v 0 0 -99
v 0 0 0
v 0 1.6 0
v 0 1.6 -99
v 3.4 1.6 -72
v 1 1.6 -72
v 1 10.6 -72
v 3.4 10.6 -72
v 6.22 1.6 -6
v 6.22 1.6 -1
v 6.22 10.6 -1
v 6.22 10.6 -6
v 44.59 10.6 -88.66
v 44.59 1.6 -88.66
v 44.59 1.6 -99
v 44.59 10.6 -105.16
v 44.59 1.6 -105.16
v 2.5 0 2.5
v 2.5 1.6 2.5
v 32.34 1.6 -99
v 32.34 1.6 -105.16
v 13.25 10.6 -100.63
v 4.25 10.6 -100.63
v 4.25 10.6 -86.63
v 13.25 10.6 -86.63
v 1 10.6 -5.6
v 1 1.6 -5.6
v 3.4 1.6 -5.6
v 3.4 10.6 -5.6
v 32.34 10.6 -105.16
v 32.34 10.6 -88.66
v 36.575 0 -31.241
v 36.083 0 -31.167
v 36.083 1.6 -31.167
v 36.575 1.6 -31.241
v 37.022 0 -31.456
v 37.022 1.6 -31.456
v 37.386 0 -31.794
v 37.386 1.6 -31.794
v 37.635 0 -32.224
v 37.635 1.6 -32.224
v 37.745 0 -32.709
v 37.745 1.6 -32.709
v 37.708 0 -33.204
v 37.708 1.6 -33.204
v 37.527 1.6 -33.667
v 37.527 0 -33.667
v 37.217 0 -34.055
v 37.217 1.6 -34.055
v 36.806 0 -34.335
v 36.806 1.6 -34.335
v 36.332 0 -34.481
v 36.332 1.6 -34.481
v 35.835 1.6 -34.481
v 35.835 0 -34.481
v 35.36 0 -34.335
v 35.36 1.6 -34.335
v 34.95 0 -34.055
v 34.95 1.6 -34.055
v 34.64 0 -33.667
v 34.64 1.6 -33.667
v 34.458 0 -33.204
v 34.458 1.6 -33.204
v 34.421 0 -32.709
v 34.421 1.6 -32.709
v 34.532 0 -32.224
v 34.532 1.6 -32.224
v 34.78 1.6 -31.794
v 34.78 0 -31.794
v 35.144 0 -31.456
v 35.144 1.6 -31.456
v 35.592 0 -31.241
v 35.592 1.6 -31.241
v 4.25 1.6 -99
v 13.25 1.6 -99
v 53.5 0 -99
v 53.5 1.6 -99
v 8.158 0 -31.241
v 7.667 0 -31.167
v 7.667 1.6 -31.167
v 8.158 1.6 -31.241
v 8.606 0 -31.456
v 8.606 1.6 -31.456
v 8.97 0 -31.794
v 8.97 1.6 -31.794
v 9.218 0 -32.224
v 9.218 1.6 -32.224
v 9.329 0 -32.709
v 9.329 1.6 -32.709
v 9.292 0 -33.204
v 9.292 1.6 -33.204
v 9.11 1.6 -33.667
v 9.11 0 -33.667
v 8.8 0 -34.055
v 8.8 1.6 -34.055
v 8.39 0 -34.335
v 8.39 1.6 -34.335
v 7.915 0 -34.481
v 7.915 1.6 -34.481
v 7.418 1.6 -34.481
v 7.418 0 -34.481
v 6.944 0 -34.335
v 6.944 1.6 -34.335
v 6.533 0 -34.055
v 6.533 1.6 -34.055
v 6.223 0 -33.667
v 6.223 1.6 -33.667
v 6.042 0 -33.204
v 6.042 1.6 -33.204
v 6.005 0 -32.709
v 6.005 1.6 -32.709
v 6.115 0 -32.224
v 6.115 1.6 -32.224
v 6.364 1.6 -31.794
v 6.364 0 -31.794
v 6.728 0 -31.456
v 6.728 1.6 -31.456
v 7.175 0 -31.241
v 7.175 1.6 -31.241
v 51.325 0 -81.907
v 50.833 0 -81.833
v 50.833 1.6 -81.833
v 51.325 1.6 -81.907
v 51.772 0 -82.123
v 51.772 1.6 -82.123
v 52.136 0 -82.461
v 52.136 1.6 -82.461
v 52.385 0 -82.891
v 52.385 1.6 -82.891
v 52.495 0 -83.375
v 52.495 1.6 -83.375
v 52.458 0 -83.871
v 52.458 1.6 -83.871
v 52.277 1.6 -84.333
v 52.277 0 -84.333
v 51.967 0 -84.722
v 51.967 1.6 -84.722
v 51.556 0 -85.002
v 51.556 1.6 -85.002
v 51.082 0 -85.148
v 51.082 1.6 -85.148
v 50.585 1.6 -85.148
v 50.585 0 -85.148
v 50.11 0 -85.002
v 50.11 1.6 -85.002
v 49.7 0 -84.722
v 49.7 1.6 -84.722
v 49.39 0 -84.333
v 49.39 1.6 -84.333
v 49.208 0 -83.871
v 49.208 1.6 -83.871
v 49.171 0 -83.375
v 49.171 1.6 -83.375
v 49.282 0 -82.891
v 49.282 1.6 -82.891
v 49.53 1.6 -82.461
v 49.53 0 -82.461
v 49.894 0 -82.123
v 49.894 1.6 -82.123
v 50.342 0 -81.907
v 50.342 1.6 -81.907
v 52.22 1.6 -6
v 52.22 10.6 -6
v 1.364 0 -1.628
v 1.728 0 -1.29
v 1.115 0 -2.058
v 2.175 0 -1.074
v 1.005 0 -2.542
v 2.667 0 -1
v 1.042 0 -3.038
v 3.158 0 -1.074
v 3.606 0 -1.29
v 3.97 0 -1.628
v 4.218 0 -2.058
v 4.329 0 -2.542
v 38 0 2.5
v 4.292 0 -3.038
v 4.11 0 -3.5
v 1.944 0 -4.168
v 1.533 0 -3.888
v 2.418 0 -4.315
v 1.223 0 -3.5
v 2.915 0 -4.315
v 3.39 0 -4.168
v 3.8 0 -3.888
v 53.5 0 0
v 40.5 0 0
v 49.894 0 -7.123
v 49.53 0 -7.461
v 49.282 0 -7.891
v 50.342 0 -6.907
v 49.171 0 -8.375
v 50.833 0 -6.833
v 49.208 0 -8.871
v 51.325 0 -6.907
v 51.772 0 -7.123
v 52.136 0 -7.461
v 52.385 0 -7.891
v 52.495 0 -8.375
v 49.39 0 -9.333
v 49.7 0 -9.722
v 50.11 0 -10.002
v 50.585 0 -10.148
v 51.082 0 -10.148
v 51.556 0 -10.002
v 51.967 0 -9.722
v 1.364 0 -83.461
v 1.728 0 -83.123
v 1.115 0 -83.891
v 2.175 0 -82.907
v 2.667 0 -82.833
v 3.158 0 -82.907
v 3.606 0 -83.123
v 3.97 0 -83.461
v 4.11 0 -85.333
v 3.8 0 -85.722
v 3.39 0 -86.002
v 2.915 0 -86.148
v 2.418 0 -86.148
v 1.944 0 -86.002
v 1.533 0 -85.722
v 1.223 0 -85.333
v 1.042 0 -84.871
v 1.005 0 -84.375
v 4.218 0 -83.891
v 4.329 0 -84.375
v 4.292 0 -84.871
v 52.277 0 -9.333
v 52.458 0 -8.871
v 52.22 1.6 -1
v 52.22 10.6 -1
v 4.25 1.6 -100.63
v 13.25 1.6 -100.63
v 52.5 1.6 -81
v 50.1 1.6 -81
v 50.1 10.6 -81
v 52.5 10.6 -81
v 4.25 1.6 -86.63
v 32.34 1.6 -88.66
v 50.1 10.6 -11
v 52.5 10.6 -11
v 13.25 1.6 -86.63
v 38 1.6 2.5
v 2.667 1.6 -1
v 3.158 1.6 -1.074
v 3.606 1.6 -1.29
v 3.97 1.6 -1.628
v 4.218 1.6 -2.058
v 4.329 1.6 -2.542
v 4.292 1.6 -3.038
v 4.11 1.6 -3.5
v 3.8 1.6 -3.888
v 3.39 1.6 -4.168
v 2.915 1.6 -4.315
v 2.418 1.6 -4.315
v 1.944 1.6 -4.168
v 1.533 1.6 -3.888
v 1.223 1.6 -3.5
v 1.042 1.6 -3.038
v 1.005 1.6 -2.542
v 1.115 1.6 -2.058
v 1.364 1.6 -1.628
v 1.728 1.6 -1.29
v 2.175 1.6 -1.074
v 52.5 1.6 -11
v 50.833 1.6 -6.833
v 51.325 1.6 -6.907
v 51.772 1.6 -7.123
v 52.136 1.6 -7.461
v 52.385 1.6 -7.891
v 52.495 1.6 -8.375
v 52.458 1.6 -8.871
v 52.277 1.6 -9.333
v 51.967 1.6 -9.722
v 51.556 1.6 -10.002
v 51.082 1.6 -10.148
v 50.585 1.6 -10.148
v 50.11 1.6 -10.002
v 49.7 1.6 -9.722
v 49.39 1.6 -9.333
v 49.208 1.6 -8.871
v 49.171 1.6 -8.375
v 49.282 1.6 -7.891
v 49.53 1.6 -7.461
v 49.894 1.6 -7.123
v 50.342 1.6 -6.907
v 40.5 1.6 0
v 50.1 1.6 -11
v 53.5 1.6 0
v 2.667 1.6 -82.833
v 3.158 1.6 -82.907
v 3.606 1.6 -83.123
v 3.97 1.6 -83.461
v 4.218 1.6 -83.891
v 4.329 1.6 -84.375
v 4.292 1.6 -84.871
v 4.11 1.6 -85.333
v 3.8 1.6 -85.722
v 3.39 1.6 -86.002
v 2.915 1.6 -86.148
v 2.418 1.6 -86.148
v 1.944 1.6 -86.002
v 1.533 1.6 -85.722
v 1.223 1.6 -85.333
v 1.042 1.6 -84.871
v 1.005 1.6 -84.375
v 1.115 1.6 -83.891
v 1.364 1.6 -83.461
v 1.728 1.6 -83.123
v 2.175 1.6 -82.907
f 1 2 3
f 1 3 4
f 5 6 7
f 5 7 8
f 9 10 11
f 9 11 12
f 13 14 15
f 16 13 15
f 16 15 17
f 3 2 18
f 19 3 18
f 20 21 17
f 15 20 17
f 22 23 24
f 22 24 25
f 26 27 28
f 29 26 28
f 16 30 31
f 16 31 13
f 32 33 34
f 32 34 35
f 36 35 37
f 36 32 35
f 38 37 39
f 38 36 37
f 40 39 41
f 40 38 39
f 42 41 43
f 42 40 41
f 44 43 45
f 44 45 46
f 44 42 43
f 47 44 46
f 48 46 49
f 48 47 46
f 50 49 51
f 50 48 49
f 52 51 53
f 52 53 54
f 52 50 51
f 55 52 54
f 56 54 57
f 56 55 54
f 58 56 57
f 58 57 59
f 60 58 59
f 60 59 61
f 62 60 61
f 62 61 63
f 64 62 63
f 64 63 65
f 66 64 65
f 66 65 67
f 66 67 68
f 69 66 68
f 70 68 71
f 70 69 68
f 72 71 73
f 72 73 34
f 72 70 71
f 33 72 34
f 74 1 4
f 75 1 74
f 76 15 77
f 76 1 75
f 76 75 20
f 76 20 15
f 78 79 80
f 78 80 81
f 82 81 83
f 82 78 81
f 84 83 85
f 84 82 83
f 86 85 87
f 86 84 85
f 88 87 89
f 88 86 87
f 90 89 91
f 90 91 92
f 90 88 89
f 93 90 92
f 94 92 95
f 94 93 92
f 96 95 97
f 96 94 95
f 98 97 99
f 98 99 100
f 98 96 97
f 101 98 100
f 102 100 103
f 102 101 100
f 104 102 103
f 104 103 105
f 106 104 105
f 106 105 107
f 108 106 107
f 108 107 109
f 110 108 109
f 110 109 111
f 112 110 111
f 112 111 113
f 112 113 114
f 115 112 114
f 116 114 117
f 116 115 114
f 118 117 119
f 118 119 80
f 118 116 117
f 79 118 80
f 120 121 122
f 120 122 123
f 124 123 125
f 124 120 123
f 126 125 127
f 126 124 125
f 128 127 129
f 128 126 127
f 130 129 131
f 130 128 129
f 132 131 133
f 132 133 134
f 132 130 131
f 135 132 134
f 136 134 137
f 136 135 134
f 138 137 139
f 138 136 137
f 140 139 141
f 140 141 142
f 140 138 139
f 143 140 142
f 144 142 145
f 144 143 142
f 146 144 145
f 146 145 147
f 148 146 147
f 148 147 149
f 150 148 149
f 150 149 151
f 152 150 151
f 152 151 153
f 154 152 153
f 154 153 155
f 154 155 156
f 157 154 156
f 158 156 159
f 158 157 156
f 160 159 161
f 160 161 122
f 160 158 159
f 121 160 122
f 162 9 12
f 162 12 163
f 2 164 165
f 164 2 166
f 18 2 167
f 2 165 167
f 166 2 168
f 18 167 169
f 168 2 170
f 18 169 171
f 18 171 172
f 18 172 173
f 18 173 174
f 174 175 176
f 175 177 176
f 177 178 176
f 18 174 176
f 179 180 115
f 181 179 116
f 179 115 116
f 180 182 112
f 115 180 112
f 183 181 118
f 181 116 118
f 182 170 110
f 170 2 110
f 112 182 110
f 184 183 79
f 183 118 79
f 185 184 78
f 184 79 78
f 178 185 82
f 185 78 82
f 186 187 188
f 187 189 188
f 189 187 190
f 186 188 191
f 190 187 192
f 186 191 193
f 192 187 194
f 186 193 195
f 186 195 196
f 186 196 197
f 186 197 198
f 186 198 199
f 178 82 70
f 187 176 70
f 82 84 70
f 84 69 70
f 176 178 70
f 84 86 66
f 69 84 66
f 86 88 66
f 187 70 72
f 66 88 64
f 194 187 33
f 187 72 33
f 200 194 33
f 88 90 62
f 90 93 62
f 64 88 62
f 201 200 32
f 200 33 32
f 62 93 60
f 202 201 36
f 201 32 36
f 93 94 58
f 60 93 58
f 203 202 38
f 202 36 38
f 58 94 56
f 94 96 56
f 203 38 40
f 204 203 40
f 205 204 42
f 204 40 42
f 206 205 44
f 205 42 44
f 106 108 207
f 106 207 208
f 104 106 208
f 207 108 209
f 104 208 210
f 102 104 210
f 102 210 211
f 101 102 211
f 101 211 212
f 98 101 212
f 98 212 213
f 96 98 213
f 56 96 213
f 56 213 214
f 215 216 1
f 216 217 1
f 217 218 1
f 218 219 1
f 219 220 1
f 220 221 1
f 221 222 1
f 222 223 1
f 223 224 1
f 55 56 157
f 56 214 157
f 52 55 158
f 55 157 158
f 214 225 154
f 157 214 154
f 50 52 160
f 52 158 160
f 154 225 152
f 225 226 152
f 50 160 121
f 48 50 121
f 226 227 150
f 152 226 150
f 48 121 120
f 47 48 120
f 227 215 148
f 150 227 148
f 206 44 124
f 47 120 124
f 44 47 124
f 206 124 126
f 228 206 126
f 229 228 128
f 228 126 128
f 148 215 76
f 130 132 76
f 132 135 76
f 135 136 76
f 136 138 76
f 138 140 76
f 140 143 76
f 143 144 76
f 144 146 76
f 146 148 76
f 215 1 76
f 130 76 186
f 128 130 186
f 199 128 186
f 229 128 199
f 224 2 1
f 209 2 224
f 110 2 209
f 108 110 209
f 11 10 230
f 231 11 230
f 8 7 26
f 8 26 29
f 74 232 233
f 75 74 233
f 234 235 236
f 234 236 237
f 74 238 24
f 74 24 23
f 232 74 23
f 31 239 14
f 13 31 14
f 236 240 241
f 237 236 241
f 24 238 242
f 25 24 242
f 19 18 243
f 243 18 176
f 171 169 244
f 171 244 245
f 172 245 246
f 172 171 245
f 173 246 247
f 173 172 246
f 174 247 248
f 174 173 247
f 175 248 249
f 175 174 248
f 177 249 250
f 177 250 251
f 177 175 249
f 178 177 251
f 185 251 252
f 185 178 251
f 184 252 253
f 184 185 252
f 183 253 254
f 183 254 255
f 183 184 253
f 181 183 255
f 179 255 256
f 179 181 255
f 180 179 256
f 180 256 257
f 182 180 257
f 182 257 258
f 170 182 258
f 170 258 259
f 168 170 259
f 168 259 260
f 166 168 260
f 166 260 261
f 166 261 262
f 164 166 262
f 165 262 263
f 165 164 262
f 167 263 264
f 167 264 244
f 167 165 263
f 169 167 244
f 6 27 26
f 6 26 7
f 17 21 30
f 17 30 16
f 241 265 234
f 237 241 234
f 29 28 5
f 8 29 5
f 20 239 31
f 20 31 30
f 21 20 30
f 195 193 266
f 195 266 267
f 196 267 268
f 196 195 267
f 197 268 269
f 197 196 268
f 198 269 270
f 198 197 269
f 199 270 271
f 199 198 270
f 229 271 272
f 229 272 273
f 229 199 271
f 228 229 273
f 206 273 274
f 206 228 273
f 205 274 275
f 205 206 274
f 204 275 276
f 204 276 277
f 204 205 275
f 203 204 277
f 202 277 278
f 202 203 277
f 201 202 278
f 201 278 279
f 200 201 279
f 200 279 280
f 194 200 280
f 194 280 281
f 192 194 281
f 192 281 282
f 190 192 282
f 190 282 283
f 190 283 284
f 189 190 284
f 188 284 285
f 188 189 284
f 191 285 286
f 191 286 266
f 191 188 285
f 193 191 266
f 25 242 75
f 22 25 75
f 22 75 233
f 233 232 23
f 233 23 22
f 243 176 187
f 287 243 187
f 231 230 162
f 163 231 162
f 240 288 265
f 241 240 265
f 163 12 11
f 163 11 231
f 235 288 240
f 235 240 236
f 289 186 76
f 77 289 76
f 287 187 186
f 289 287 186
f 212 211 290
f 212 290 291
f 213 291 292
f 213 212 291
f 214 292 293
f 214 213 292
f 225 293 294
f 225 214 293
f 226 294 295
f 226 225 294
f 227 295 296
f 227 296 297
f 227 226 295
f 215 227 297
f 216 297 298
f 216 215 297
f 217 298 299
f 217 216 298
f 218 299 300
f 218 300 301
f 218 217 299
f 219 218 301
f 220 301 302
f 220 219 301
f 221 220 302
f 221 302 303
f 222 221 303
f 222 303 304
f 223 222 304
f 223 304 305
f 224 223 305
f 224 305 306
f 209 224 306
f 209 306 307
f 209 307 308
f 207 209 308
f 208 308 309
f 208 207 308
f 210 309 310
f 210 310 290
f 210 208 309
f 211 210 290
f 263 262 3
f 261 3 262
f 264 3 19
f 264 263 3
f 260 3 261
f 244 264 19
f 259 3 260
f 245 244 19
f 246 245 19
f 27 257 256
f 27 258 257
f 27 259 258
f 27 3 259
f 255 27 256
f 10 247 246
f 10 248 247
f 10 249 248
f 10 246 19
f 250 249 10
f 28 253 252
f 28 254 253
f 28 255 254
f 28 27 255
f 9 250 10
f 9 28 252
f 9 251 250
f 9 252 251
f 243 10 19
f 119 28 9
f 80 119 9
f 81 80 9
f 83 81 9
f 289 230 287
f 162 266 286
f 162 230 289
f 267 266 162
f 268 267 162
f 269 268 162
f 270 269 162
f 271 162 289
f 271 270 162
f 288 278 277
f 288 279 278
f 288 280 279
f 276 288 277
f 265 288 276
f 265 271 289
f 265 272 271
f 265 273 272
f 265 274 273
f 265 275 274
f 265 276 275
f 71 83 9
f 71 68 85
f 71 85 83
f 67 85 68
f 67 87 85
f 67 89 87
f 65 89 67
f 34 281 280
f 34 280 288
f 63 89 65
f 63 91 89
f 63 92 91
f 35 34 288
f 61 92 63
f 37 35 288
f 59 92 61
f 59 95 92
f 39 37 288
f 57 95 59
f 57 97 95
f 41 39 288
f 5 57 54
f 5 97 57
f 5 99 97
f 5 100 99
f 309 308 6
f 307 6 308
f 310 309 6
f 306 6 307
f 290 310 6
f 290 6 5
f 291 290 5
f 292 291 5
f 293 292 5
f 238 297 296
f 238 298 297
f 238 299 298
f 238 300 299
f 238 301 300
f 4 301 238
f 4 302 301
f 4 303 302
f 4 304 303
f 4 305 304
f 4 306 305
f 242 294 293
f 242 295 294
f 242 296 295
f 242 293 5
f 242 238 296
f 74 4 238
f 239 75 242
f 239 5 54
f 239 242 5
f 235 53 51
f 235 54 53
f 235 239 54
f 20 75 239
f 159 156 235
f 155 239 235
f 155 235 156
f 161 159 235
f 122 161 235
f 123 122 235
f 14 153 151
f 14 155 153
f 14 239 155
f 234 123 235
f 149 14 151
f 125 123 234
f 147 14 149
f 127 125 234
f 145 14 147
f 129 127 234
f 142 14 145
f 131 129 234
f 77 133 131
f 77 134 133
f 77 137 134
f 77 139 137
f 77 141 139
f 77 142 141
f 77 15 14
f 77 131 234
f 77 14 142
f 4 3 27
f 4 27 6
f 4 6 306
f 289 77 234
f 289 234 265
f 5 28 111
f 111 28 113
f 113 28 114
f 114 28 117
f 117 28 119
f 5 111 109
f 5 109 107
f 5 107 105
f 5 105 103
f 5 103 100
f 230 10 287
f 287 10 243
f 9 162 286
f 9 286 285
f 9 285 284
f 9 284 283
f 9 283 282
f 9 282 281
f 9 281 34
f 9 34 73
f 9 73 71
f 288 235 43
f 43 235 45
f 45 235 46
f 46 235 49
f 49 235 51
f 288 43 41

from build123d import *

# Parameters (mm, degrees)
SKETCH1_W           = 53.5
SKETCH1_H           = 99
SKETCH1_R           = 1.666666667
BOSS_EXTRUDE1_DEPTH = 1.6
SKETCH2_W           = 46
SKETCH2_H           = 5
SKETCH2_W_2         = 2.4
SKETCH2_H_2         = 66.4
SKETCH2_H_3         = 70
SKETCH2_W_3         = 9
SKETCH2_H_4         = 14
SKETCH2_W_4         = 12.25
SKETCH2_H_5         = 16.5
BOSS_EXTRUDE2_DEPTH = 9


with BuildPart() as part:
    # Sketch1 → Boss-Extrude1 (new body)
    # profile 1 of 2: a face of its own
    with BuildSketch(Plane(origin=(0, 0, 0), x_dir=(1, 0, 0), z_dir=(0, 1, 0))):
        with Locations((26.75, 49.5)):
            Rectangle(SKETCH1_W, SKETCH1_H)
        with Locations(Location((50.833333333, 8.5, 0), (0, 0, 270))):
            Circle(SKETCH1_R, mode=Mode.SUBTRACT)
        with Locations(Location((2.666666667, 2.666666667, 0), (0, 0, 270))):
            Circle(SKETCH1_R, mode=Mode.SUBTRACT)
        with Locations(Location((36.083333333, 32.833333333, 0), (0, 0, 270))):
            Circle(SKETCH1_R, mode=Mode.SUBTRACT)
        with Locations(Location((7.666666667, 32.833333333, 0), (0, 0, 270))):
            Circle(SKETCH1_R, mode=Mode.SUBTRACT)
        with Locations(Location((50.833333333, 83.5, 0), (0, 0, 270))):
            Circle(SKETCH1_R, mode=Mode.SUBTRACT)
        with Locations(Location((2.666666667, 84.5, 0), (0, 0, 270))):
            Circle(SKETCH1_R, mode=Mode.SUBTRACT)
    # profile 2 of 2: a face of its own
    with BuildSketch(Plane(origin=(0, 0, 0), x_dir=(1, 0, 0), z_dir=(0, 1, 0))):
        Polygon((0, 0), (2.5, -2.5), (38, -2.5), (40.5, 0), align=None)
    extrude(amount=BOSS_EXTRUDE1_DEPTH)

    # Sketch2 → Boss-Extrude2 (add)
    with BuildSketch(Plane(origin=(0, 1.6, 0), x_dir=(1, 0, 0), z_dir=(0, 1, 0))):
        with Locations((29.22, 3.5)):
            Rectangle(SKETCH2_W, SKETCH2_H)
        with Locations((2.2, 38.8)):
            Rectangle(SKETCH2_W_2, SKETCH2_H_2)
        with Locations((51.3, 46)):
            Rectangle(SKETCH2_W_2, SKETCH2_H_3)
        with Locations((8.75, 93.63)):
            Rectangle(SKETCH2_W_3, SKETCH2_H_4)
        with Locations((38.465, 96.91)):
            Rectangle(SKETCH2_W_4, SKETCH2_H_5)
    extrude(amount=BOSS_EXTRUDE2_DEPTH)


solid = part.part
